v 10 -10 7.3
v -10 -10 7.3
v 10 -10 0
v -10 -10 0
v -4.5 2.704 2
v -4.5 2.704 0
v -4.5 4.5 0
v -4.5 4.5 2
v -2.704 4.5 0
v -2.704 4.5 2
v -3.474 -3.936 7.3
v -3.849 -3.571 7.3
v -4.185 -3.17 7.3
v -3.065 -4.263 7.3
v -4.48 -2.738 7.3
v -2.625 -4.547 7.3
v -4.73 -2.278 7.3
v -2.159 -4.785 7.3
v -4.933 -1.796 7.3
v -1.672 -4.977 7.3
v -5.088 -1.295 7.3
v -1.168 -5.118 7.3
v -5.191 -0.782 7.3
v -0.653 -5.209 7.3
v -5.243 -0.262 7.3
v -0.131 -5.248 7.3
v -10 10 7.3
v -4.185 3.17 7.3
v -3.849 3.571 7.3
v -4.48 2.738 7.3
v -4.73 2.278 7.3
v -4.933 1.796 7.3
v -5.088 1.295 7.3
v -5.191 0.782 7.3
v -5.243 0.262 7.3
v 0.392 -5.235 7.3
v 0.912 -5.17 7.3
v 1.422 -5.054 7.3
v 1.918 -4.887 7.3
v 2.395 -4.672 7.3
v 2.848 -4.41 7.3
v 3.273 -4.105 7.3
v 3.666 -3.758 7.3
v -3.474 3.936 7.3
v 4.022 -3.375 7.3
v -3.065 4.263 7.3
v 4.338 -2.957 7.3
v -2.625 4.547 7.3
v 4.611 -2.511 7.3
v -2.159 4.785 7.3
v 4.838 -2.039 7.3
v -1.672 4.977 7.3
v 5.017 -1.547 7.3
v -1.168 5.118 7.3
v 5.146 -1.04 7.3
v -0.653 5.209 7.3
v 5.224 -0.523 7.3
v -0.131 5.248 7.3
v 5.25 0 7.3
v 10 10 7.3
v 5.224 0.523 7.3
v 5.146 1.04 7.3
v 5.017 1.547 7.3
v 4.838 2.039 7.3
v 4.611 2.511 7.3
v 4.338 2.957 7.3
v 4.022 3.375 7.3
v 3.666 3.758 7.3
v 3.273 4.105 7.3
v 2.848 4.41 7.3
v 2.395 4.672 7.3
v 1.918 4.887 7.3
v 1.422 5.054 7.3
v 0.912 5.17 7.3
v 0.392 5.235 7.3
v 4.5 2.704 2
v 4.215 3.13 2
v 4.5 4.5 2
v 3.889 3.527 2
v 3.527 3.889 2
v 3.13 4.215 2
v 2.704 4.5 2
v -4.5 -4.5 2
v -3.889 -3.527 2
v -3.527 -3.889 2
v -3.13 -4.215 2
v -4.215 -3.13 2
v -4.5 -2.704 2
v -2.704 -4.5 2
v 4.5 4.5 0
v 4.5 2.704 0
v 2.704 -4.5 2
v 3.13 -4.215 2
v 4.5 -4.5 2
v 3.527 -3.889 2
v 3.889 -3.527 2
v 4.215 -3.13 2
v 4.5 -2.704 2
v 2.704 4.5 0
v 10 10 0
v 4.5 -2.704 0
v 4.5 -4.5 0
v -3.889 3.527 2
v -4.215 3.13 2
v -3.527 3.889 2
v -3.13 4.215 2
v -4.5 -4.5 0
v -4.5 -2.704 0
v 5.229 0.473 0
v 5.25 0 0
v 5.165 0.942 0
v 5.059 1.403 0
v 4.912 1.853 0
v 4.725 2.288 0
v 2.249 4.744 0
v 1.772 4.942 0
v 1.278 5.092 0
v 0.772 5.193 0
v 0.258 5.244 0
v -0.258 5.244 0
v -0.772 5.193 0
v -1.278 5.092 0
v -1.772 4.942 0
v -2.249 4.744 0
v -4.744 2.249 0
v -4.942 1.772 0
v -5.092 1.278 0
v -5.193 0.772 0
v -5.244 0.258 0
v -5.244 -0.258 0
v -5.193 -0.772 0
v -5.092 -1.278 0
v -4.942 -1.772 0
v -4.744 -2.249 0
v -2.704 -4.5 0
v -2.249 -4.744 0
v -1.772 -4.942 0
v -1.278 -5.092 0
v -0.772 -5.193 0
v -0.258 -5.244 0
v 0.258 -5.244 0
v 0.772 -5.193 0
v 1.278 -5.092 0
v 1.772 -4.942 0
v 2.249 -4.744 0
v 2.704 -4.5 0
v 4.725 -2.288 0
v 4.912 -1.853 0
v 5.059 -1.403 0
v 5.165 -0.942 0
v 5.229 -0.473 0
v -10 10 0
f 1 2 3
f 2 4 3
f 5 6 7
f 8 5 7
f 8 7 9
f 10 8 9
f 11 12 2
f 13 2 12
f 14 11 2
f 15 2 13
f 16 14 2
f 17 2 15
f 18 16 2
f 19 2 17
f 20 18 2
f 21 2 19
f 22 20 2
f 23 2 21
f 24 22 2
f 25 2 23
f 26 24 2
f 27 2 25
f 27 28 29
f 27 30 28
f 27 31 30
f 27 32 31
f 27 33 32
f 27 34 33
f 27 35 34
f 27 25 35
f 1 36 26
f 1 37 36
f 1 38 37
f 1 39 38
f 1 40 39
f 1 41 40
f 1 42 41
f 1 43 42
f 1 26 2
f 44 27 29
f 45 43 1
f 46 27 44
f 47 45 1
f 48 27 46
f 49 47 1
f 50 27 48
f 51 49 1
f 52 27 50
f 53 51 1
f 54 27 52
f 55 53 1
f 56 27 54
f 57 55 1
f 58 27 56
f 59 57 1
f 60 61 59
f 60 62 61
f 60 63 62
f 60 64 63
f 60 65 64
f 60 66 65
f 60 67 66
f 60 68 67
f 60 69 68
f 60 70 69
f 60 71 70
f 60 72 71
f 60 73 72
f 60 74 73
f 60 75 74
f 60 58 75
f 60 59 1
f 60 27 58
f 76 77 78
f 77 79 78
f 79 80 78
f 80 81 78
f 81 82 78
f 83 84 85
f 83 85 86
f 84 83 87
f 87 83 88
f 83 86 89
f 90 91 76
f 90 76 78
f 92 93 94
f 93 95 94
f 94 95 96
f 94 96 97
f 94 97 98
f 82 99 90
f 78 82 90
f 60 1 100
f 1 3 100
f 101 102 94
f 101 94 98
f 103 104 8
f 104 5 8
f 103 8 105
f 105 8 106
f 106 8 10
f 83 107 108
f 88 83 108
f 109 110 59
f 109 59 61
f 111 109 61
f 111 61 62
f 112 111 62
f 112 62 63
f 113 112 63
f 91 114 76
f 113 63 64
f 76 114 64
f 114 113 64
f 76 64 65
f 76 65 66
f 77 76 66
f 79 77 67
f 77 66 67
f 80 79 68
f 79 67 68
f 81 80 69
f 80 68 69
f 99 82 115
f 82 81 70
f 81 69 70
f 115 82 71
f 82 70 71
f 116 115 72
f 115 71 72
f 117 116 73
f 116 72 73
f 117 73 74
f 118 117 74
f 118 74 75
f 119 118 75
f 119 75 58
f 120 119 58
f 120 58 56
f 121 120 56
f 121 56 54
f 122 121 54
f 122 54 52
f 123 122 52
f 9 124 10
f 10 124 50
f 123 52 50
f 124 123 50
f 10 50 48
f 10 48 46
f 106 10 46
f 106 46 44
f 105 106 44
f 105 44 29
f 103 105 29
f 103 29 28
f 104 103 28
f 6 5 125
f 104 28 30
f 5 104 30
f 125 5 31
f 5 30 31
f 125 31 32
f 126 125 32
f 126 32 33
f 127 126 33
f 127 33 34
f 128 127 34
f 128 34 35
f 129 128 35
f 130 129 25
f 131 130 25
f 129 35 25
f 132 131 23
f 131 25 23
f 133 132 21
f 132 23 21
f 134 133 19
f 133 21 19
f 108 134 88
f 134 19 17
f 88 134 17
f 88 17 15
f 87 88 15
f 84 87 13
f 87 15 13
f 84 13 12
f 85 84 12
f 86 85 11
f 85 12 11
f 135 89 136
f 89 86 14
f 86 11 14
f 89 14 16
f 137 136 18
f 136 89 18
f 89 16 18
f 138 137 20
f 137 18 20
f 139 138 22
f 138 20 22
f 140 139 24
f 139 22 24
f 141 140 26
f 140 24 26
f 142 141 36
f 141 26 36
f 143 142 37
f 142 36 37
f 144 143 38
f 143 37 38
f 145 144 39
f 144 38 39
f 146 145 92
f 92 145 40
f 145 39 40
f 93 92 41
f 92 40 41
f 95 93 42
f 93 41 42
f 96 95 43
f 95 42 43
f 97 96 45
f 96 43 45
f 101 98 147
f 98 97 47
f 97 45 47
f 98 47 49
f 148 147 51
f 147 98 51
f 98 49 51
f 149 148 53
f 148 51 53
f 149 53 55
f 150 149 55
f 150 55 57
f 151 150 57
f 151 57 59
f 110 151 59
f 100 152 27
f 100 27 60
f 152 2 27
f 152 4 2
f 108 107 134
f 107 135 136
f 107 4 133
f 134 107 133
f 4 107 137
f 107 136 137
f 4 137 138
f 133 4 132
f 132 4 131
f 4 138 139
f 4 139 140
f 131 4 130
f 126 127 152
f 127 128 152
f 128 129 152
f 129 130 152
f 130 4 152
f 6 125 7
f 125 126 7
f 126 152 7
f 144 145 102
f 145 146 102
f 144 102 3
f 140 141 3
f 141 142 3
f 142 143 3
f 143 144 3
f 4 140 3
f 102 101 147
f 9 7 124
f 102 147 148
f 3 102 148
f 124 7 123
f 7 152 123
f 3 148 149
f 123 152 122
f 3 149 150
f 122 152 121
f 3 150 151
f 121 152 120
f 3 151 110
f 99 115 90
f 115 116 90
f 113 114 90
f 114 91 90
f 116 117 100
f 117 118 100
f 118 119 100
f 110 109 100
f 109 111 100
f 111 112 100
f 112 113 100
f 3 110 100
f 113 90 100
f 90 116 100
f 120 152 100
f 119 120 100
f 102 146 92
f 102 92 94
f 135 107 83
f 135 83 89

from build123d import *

# Parameters (mm, degrees)
F0_W     = 20
F0_H     = 20
F0_W_2   = 9
F0_H_2   = 9
F1_DEPTH = 2
F2_W     = 20
F2_H     = 20
F3_DEPTH = 5.3
F4_R     = 5.25
F5_DEPTH = 10


with BuildPart() as f1:
    # F0 (on Top) → F1 (new body)
    with BuildSketch(Plane.XY):
        Rectangle(F0_W, F0_H)
        Rectangle(F0_W_2, F0_H_2, mode=Mode.SUBTRACT)
    extrude(amount=F1_DEPTH)

    # F2 (on face) → F3 (join)
    with BuildSketch(Plane.XY.offset(2)):
        Rectangle(F2_W, F2_H)
    extrude(amount=F3_DEPTH)

    # F4 (on face) → F5 (cut)
    with BuildSketch(Plane.XY.offset(7.3)):
        Circle(F4_R)
    extrude(amount=-F5_DEPTH, mode=Mode.SUBTRACT)


solid = f1.part
